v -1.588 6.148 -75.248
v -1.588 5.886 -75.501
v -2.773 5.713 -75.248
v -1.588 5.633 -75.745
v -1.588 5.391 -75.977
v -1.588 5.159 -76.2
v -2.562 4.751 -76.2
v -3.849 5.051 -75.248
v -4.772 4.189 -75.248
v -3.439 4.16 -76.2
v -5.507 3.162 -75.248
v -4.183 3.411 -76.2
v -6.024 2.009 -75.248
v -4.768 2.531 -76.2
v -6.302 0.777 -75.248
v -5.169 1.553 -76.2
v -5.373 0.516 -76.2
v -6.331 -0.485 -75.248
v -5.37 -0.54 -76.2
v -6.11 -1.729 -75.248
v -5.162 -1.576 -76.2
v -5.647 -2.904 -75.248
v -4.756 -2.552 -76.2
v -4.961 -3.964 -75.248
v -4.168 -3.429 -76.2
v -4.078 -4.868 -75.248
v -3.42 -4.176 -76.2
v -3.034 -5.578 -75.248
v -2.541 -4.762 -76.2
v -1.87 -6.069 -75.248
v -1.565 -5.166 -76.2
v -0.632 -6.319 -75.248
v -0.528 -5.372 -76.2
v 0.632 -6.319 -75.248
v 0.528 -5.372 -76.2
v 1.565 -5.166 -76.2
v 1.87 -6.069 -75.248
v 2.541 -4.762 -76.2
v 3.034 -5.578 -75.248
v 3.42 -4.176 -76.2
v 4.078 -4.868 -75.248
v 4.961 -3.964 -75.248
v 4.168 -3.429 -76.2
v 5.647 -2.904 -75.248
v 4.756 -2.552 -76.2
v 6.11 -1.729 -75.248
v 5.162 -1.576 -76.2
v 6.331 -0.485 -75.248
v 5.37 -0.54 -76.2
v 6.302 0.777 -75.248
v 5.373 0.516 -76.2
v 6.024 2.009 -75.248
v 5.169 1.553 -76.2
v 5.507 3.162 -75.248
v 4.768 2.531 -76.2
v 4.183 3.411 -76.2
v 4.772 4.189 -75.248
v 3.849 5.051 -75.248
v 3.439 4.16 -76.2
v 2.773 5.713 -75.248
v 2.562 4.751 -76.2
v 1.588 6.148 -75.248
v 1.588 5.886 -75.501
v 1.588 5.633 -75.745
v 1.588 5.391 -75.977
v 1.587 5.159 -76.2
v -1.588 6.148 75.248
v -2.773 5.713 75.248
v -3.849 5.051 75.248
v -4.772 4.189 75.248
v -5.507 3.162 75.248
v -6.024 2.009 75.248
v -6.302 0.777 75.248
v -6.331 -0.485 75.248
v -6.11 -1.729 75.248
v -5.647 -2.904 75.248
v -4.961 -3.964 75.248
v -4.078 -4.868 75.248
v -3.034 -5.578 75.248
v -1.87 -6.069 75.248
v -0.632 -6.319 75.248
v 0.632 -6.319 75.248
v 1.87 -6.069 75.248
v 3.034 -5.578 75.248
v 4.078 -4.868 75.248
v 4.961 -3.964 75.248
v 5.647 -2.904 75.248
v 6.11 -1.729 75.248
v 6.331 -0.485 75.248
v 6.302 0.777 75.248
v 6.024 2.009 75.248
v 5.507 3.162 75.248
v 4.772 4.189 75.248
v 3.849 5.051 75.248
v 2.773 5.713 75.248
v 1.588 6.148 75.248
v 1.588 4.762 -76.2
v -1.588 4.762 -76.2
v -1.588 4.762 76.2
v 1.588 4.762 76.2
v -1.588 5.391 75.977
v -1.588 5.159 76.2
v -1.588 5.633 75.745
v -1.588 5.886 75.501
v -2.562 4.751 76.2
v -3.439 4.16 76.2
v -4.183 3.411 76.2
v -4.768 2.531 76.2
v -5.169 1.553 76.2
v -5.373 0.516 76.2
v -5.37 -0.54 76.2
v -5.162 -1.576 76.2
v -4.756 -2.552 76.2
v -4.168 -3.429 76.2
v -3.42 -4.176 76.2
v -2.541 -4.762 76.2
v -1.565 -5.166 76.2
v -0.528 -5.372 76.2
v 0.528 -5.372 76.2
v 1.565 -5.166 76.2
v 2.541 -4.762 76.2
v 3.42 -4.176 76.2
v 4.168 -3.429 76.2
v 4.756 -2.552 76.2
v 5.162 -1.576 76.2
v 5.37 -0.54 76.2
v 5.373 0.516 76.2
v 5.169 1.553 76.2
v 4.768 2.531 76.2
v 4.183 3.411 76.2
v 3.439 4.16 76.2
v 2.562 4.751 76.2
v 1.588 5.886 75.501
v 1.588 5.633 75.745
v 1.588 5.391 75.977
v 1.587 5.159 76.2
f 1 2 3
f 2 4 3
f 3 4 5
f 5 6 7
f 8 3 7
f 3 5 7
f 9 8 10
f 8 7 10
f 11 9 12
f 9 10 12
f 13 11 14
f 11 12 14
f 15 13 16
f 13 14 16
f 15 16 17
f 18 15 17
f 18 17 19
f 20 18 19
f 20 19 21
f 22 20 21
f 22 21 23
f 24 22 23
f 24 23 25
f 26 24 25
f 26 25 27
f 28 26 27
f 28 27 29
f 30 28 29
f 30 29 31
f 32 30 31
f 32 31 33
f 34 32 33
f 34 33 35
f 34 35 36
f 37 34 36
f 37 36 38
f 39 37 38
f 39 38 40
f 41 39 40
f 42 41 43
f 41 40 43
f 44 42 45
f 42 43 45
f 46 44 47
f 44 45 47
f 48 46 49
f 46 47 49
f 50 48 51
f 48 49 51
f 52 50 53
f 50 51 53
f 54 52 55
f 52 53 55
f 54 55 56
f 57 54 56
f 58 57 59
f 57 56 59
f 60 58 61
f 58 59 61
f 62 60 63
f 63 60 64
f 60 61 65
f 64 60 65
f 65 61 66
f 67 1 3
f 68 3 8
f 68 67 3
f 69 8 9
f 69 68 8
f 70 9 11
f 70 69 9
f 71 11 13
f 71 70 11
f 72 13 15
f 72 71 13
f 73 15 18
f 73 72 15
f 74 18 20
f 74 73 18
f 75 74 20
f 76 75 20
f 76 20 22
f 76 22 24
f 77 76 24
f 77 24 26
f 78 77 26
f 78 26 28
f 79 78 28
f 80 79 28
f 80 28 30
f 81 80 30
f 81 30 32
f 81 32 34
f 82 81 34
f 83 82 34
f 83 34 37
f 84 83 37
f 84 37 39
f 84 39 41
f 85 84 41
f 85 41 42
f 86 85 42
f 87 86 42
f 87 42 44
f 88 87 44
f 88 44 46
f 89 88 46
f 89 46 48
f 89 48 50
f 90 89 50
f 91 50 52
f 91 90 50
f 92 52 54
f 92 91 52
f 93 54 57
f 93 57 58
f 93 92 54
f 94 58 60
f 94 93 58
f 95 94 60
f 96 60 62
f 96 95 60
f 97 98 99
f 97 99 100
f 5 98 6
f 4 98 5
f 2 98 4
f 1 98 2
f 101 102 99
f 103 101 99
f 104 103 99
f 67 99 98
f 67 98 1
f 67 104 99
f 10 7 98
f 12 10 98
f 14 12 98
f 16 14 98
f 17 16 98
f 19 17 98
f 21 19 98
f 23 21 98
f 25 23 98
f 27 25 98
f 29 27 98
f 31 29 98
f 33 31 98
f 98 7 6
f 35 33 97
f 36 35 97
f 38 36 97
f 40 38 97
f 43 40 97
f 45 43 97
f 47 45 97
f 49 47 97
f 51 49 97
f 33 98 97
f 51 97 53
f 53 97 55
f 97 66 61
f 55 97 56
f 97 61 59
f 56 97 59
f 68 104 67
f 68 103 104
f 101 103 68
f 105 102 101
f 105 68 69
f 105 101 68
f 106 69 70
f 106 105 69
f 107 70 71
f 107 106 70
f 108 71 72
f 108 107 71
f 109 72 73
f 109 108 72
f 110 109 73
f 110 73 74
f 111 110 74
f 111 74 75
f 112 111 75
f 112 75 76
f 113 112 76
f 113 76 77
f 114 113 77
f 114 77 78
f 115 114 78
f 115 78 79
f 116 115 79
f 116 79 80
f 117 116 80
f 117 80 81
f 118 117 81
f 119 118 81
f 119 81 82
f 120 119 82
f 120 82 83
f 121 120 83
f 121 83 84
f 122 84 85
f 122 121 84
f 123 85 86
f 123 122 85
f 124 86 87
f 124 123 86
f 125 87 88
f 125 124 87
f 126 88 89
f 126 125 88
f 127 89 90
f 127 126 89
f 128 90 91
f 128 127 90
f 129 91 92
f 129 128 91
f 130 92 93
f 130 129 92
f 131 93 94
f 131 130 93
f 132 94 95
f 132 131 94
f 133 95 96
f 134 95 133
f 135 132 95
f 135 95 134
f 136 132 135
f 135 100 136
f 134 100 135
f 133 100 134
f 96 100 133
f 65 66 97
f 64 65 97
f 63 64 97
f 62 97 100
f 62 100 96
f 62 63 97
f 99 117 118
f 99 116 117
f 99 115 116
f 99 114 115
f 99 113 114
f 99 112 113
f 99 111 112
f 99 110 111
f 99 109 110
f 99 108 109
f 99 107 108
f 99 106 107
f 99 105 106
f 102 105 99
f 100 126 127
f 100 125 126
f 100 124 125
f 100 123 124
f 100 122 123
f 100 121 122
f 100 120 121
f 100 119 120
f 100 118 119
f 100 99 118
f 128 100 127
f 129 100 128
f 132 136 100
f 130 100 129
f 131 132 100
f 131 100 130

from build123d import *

# Parameters (mm, degrees)
SKETCH1_R           = 6.35
EXTRUDE1_DEPTH      = 76.2
CHAMFER1_SIZE       = 0.9525
SKETCH3_W           = 3.175
SKETCH3_H           = 1.5875
EXTRUDE2_DEPTH      = 77.2
EXTRUDE2_DEPTH_BACK = 77.2


with BuildPart() as part:
    # Sketch1 → Extrude1 (new body, symmetric)
    with BuildSketch(Plane.XY):
        Circle(SKETCH1_R)
    extrude(amount=EXTRUDE1_DEPTH, both=True)

    # Chamfer1
    chamfer1_edges = [part.edges().sort_by_distance(p)[0] for p in [
        (-6.35, 0, -76.2),
        (-6.35, 0, 76.2),
    ]]
    chamfer(chamfer1_edges, length=CHAMFER1_SIZE)

    # Sketch3 → Extrude2 (cut, two sides)
    with BuildSketch(Plane.XY) as extrude2_sk:
        with Locations((0, 5.55625)):
            Rectangle(SKETCH3_W, SKETCH3_H)
    extrude(amount=EXTRUDE2_DEPTH, mode=Mode.SUBTRACT)
    extrude(extrude2_sk.sketch, amount=-EXTRUDE2_DEPTH_BACK, mode=Mode.SUBTRACT)


solid = part.part
